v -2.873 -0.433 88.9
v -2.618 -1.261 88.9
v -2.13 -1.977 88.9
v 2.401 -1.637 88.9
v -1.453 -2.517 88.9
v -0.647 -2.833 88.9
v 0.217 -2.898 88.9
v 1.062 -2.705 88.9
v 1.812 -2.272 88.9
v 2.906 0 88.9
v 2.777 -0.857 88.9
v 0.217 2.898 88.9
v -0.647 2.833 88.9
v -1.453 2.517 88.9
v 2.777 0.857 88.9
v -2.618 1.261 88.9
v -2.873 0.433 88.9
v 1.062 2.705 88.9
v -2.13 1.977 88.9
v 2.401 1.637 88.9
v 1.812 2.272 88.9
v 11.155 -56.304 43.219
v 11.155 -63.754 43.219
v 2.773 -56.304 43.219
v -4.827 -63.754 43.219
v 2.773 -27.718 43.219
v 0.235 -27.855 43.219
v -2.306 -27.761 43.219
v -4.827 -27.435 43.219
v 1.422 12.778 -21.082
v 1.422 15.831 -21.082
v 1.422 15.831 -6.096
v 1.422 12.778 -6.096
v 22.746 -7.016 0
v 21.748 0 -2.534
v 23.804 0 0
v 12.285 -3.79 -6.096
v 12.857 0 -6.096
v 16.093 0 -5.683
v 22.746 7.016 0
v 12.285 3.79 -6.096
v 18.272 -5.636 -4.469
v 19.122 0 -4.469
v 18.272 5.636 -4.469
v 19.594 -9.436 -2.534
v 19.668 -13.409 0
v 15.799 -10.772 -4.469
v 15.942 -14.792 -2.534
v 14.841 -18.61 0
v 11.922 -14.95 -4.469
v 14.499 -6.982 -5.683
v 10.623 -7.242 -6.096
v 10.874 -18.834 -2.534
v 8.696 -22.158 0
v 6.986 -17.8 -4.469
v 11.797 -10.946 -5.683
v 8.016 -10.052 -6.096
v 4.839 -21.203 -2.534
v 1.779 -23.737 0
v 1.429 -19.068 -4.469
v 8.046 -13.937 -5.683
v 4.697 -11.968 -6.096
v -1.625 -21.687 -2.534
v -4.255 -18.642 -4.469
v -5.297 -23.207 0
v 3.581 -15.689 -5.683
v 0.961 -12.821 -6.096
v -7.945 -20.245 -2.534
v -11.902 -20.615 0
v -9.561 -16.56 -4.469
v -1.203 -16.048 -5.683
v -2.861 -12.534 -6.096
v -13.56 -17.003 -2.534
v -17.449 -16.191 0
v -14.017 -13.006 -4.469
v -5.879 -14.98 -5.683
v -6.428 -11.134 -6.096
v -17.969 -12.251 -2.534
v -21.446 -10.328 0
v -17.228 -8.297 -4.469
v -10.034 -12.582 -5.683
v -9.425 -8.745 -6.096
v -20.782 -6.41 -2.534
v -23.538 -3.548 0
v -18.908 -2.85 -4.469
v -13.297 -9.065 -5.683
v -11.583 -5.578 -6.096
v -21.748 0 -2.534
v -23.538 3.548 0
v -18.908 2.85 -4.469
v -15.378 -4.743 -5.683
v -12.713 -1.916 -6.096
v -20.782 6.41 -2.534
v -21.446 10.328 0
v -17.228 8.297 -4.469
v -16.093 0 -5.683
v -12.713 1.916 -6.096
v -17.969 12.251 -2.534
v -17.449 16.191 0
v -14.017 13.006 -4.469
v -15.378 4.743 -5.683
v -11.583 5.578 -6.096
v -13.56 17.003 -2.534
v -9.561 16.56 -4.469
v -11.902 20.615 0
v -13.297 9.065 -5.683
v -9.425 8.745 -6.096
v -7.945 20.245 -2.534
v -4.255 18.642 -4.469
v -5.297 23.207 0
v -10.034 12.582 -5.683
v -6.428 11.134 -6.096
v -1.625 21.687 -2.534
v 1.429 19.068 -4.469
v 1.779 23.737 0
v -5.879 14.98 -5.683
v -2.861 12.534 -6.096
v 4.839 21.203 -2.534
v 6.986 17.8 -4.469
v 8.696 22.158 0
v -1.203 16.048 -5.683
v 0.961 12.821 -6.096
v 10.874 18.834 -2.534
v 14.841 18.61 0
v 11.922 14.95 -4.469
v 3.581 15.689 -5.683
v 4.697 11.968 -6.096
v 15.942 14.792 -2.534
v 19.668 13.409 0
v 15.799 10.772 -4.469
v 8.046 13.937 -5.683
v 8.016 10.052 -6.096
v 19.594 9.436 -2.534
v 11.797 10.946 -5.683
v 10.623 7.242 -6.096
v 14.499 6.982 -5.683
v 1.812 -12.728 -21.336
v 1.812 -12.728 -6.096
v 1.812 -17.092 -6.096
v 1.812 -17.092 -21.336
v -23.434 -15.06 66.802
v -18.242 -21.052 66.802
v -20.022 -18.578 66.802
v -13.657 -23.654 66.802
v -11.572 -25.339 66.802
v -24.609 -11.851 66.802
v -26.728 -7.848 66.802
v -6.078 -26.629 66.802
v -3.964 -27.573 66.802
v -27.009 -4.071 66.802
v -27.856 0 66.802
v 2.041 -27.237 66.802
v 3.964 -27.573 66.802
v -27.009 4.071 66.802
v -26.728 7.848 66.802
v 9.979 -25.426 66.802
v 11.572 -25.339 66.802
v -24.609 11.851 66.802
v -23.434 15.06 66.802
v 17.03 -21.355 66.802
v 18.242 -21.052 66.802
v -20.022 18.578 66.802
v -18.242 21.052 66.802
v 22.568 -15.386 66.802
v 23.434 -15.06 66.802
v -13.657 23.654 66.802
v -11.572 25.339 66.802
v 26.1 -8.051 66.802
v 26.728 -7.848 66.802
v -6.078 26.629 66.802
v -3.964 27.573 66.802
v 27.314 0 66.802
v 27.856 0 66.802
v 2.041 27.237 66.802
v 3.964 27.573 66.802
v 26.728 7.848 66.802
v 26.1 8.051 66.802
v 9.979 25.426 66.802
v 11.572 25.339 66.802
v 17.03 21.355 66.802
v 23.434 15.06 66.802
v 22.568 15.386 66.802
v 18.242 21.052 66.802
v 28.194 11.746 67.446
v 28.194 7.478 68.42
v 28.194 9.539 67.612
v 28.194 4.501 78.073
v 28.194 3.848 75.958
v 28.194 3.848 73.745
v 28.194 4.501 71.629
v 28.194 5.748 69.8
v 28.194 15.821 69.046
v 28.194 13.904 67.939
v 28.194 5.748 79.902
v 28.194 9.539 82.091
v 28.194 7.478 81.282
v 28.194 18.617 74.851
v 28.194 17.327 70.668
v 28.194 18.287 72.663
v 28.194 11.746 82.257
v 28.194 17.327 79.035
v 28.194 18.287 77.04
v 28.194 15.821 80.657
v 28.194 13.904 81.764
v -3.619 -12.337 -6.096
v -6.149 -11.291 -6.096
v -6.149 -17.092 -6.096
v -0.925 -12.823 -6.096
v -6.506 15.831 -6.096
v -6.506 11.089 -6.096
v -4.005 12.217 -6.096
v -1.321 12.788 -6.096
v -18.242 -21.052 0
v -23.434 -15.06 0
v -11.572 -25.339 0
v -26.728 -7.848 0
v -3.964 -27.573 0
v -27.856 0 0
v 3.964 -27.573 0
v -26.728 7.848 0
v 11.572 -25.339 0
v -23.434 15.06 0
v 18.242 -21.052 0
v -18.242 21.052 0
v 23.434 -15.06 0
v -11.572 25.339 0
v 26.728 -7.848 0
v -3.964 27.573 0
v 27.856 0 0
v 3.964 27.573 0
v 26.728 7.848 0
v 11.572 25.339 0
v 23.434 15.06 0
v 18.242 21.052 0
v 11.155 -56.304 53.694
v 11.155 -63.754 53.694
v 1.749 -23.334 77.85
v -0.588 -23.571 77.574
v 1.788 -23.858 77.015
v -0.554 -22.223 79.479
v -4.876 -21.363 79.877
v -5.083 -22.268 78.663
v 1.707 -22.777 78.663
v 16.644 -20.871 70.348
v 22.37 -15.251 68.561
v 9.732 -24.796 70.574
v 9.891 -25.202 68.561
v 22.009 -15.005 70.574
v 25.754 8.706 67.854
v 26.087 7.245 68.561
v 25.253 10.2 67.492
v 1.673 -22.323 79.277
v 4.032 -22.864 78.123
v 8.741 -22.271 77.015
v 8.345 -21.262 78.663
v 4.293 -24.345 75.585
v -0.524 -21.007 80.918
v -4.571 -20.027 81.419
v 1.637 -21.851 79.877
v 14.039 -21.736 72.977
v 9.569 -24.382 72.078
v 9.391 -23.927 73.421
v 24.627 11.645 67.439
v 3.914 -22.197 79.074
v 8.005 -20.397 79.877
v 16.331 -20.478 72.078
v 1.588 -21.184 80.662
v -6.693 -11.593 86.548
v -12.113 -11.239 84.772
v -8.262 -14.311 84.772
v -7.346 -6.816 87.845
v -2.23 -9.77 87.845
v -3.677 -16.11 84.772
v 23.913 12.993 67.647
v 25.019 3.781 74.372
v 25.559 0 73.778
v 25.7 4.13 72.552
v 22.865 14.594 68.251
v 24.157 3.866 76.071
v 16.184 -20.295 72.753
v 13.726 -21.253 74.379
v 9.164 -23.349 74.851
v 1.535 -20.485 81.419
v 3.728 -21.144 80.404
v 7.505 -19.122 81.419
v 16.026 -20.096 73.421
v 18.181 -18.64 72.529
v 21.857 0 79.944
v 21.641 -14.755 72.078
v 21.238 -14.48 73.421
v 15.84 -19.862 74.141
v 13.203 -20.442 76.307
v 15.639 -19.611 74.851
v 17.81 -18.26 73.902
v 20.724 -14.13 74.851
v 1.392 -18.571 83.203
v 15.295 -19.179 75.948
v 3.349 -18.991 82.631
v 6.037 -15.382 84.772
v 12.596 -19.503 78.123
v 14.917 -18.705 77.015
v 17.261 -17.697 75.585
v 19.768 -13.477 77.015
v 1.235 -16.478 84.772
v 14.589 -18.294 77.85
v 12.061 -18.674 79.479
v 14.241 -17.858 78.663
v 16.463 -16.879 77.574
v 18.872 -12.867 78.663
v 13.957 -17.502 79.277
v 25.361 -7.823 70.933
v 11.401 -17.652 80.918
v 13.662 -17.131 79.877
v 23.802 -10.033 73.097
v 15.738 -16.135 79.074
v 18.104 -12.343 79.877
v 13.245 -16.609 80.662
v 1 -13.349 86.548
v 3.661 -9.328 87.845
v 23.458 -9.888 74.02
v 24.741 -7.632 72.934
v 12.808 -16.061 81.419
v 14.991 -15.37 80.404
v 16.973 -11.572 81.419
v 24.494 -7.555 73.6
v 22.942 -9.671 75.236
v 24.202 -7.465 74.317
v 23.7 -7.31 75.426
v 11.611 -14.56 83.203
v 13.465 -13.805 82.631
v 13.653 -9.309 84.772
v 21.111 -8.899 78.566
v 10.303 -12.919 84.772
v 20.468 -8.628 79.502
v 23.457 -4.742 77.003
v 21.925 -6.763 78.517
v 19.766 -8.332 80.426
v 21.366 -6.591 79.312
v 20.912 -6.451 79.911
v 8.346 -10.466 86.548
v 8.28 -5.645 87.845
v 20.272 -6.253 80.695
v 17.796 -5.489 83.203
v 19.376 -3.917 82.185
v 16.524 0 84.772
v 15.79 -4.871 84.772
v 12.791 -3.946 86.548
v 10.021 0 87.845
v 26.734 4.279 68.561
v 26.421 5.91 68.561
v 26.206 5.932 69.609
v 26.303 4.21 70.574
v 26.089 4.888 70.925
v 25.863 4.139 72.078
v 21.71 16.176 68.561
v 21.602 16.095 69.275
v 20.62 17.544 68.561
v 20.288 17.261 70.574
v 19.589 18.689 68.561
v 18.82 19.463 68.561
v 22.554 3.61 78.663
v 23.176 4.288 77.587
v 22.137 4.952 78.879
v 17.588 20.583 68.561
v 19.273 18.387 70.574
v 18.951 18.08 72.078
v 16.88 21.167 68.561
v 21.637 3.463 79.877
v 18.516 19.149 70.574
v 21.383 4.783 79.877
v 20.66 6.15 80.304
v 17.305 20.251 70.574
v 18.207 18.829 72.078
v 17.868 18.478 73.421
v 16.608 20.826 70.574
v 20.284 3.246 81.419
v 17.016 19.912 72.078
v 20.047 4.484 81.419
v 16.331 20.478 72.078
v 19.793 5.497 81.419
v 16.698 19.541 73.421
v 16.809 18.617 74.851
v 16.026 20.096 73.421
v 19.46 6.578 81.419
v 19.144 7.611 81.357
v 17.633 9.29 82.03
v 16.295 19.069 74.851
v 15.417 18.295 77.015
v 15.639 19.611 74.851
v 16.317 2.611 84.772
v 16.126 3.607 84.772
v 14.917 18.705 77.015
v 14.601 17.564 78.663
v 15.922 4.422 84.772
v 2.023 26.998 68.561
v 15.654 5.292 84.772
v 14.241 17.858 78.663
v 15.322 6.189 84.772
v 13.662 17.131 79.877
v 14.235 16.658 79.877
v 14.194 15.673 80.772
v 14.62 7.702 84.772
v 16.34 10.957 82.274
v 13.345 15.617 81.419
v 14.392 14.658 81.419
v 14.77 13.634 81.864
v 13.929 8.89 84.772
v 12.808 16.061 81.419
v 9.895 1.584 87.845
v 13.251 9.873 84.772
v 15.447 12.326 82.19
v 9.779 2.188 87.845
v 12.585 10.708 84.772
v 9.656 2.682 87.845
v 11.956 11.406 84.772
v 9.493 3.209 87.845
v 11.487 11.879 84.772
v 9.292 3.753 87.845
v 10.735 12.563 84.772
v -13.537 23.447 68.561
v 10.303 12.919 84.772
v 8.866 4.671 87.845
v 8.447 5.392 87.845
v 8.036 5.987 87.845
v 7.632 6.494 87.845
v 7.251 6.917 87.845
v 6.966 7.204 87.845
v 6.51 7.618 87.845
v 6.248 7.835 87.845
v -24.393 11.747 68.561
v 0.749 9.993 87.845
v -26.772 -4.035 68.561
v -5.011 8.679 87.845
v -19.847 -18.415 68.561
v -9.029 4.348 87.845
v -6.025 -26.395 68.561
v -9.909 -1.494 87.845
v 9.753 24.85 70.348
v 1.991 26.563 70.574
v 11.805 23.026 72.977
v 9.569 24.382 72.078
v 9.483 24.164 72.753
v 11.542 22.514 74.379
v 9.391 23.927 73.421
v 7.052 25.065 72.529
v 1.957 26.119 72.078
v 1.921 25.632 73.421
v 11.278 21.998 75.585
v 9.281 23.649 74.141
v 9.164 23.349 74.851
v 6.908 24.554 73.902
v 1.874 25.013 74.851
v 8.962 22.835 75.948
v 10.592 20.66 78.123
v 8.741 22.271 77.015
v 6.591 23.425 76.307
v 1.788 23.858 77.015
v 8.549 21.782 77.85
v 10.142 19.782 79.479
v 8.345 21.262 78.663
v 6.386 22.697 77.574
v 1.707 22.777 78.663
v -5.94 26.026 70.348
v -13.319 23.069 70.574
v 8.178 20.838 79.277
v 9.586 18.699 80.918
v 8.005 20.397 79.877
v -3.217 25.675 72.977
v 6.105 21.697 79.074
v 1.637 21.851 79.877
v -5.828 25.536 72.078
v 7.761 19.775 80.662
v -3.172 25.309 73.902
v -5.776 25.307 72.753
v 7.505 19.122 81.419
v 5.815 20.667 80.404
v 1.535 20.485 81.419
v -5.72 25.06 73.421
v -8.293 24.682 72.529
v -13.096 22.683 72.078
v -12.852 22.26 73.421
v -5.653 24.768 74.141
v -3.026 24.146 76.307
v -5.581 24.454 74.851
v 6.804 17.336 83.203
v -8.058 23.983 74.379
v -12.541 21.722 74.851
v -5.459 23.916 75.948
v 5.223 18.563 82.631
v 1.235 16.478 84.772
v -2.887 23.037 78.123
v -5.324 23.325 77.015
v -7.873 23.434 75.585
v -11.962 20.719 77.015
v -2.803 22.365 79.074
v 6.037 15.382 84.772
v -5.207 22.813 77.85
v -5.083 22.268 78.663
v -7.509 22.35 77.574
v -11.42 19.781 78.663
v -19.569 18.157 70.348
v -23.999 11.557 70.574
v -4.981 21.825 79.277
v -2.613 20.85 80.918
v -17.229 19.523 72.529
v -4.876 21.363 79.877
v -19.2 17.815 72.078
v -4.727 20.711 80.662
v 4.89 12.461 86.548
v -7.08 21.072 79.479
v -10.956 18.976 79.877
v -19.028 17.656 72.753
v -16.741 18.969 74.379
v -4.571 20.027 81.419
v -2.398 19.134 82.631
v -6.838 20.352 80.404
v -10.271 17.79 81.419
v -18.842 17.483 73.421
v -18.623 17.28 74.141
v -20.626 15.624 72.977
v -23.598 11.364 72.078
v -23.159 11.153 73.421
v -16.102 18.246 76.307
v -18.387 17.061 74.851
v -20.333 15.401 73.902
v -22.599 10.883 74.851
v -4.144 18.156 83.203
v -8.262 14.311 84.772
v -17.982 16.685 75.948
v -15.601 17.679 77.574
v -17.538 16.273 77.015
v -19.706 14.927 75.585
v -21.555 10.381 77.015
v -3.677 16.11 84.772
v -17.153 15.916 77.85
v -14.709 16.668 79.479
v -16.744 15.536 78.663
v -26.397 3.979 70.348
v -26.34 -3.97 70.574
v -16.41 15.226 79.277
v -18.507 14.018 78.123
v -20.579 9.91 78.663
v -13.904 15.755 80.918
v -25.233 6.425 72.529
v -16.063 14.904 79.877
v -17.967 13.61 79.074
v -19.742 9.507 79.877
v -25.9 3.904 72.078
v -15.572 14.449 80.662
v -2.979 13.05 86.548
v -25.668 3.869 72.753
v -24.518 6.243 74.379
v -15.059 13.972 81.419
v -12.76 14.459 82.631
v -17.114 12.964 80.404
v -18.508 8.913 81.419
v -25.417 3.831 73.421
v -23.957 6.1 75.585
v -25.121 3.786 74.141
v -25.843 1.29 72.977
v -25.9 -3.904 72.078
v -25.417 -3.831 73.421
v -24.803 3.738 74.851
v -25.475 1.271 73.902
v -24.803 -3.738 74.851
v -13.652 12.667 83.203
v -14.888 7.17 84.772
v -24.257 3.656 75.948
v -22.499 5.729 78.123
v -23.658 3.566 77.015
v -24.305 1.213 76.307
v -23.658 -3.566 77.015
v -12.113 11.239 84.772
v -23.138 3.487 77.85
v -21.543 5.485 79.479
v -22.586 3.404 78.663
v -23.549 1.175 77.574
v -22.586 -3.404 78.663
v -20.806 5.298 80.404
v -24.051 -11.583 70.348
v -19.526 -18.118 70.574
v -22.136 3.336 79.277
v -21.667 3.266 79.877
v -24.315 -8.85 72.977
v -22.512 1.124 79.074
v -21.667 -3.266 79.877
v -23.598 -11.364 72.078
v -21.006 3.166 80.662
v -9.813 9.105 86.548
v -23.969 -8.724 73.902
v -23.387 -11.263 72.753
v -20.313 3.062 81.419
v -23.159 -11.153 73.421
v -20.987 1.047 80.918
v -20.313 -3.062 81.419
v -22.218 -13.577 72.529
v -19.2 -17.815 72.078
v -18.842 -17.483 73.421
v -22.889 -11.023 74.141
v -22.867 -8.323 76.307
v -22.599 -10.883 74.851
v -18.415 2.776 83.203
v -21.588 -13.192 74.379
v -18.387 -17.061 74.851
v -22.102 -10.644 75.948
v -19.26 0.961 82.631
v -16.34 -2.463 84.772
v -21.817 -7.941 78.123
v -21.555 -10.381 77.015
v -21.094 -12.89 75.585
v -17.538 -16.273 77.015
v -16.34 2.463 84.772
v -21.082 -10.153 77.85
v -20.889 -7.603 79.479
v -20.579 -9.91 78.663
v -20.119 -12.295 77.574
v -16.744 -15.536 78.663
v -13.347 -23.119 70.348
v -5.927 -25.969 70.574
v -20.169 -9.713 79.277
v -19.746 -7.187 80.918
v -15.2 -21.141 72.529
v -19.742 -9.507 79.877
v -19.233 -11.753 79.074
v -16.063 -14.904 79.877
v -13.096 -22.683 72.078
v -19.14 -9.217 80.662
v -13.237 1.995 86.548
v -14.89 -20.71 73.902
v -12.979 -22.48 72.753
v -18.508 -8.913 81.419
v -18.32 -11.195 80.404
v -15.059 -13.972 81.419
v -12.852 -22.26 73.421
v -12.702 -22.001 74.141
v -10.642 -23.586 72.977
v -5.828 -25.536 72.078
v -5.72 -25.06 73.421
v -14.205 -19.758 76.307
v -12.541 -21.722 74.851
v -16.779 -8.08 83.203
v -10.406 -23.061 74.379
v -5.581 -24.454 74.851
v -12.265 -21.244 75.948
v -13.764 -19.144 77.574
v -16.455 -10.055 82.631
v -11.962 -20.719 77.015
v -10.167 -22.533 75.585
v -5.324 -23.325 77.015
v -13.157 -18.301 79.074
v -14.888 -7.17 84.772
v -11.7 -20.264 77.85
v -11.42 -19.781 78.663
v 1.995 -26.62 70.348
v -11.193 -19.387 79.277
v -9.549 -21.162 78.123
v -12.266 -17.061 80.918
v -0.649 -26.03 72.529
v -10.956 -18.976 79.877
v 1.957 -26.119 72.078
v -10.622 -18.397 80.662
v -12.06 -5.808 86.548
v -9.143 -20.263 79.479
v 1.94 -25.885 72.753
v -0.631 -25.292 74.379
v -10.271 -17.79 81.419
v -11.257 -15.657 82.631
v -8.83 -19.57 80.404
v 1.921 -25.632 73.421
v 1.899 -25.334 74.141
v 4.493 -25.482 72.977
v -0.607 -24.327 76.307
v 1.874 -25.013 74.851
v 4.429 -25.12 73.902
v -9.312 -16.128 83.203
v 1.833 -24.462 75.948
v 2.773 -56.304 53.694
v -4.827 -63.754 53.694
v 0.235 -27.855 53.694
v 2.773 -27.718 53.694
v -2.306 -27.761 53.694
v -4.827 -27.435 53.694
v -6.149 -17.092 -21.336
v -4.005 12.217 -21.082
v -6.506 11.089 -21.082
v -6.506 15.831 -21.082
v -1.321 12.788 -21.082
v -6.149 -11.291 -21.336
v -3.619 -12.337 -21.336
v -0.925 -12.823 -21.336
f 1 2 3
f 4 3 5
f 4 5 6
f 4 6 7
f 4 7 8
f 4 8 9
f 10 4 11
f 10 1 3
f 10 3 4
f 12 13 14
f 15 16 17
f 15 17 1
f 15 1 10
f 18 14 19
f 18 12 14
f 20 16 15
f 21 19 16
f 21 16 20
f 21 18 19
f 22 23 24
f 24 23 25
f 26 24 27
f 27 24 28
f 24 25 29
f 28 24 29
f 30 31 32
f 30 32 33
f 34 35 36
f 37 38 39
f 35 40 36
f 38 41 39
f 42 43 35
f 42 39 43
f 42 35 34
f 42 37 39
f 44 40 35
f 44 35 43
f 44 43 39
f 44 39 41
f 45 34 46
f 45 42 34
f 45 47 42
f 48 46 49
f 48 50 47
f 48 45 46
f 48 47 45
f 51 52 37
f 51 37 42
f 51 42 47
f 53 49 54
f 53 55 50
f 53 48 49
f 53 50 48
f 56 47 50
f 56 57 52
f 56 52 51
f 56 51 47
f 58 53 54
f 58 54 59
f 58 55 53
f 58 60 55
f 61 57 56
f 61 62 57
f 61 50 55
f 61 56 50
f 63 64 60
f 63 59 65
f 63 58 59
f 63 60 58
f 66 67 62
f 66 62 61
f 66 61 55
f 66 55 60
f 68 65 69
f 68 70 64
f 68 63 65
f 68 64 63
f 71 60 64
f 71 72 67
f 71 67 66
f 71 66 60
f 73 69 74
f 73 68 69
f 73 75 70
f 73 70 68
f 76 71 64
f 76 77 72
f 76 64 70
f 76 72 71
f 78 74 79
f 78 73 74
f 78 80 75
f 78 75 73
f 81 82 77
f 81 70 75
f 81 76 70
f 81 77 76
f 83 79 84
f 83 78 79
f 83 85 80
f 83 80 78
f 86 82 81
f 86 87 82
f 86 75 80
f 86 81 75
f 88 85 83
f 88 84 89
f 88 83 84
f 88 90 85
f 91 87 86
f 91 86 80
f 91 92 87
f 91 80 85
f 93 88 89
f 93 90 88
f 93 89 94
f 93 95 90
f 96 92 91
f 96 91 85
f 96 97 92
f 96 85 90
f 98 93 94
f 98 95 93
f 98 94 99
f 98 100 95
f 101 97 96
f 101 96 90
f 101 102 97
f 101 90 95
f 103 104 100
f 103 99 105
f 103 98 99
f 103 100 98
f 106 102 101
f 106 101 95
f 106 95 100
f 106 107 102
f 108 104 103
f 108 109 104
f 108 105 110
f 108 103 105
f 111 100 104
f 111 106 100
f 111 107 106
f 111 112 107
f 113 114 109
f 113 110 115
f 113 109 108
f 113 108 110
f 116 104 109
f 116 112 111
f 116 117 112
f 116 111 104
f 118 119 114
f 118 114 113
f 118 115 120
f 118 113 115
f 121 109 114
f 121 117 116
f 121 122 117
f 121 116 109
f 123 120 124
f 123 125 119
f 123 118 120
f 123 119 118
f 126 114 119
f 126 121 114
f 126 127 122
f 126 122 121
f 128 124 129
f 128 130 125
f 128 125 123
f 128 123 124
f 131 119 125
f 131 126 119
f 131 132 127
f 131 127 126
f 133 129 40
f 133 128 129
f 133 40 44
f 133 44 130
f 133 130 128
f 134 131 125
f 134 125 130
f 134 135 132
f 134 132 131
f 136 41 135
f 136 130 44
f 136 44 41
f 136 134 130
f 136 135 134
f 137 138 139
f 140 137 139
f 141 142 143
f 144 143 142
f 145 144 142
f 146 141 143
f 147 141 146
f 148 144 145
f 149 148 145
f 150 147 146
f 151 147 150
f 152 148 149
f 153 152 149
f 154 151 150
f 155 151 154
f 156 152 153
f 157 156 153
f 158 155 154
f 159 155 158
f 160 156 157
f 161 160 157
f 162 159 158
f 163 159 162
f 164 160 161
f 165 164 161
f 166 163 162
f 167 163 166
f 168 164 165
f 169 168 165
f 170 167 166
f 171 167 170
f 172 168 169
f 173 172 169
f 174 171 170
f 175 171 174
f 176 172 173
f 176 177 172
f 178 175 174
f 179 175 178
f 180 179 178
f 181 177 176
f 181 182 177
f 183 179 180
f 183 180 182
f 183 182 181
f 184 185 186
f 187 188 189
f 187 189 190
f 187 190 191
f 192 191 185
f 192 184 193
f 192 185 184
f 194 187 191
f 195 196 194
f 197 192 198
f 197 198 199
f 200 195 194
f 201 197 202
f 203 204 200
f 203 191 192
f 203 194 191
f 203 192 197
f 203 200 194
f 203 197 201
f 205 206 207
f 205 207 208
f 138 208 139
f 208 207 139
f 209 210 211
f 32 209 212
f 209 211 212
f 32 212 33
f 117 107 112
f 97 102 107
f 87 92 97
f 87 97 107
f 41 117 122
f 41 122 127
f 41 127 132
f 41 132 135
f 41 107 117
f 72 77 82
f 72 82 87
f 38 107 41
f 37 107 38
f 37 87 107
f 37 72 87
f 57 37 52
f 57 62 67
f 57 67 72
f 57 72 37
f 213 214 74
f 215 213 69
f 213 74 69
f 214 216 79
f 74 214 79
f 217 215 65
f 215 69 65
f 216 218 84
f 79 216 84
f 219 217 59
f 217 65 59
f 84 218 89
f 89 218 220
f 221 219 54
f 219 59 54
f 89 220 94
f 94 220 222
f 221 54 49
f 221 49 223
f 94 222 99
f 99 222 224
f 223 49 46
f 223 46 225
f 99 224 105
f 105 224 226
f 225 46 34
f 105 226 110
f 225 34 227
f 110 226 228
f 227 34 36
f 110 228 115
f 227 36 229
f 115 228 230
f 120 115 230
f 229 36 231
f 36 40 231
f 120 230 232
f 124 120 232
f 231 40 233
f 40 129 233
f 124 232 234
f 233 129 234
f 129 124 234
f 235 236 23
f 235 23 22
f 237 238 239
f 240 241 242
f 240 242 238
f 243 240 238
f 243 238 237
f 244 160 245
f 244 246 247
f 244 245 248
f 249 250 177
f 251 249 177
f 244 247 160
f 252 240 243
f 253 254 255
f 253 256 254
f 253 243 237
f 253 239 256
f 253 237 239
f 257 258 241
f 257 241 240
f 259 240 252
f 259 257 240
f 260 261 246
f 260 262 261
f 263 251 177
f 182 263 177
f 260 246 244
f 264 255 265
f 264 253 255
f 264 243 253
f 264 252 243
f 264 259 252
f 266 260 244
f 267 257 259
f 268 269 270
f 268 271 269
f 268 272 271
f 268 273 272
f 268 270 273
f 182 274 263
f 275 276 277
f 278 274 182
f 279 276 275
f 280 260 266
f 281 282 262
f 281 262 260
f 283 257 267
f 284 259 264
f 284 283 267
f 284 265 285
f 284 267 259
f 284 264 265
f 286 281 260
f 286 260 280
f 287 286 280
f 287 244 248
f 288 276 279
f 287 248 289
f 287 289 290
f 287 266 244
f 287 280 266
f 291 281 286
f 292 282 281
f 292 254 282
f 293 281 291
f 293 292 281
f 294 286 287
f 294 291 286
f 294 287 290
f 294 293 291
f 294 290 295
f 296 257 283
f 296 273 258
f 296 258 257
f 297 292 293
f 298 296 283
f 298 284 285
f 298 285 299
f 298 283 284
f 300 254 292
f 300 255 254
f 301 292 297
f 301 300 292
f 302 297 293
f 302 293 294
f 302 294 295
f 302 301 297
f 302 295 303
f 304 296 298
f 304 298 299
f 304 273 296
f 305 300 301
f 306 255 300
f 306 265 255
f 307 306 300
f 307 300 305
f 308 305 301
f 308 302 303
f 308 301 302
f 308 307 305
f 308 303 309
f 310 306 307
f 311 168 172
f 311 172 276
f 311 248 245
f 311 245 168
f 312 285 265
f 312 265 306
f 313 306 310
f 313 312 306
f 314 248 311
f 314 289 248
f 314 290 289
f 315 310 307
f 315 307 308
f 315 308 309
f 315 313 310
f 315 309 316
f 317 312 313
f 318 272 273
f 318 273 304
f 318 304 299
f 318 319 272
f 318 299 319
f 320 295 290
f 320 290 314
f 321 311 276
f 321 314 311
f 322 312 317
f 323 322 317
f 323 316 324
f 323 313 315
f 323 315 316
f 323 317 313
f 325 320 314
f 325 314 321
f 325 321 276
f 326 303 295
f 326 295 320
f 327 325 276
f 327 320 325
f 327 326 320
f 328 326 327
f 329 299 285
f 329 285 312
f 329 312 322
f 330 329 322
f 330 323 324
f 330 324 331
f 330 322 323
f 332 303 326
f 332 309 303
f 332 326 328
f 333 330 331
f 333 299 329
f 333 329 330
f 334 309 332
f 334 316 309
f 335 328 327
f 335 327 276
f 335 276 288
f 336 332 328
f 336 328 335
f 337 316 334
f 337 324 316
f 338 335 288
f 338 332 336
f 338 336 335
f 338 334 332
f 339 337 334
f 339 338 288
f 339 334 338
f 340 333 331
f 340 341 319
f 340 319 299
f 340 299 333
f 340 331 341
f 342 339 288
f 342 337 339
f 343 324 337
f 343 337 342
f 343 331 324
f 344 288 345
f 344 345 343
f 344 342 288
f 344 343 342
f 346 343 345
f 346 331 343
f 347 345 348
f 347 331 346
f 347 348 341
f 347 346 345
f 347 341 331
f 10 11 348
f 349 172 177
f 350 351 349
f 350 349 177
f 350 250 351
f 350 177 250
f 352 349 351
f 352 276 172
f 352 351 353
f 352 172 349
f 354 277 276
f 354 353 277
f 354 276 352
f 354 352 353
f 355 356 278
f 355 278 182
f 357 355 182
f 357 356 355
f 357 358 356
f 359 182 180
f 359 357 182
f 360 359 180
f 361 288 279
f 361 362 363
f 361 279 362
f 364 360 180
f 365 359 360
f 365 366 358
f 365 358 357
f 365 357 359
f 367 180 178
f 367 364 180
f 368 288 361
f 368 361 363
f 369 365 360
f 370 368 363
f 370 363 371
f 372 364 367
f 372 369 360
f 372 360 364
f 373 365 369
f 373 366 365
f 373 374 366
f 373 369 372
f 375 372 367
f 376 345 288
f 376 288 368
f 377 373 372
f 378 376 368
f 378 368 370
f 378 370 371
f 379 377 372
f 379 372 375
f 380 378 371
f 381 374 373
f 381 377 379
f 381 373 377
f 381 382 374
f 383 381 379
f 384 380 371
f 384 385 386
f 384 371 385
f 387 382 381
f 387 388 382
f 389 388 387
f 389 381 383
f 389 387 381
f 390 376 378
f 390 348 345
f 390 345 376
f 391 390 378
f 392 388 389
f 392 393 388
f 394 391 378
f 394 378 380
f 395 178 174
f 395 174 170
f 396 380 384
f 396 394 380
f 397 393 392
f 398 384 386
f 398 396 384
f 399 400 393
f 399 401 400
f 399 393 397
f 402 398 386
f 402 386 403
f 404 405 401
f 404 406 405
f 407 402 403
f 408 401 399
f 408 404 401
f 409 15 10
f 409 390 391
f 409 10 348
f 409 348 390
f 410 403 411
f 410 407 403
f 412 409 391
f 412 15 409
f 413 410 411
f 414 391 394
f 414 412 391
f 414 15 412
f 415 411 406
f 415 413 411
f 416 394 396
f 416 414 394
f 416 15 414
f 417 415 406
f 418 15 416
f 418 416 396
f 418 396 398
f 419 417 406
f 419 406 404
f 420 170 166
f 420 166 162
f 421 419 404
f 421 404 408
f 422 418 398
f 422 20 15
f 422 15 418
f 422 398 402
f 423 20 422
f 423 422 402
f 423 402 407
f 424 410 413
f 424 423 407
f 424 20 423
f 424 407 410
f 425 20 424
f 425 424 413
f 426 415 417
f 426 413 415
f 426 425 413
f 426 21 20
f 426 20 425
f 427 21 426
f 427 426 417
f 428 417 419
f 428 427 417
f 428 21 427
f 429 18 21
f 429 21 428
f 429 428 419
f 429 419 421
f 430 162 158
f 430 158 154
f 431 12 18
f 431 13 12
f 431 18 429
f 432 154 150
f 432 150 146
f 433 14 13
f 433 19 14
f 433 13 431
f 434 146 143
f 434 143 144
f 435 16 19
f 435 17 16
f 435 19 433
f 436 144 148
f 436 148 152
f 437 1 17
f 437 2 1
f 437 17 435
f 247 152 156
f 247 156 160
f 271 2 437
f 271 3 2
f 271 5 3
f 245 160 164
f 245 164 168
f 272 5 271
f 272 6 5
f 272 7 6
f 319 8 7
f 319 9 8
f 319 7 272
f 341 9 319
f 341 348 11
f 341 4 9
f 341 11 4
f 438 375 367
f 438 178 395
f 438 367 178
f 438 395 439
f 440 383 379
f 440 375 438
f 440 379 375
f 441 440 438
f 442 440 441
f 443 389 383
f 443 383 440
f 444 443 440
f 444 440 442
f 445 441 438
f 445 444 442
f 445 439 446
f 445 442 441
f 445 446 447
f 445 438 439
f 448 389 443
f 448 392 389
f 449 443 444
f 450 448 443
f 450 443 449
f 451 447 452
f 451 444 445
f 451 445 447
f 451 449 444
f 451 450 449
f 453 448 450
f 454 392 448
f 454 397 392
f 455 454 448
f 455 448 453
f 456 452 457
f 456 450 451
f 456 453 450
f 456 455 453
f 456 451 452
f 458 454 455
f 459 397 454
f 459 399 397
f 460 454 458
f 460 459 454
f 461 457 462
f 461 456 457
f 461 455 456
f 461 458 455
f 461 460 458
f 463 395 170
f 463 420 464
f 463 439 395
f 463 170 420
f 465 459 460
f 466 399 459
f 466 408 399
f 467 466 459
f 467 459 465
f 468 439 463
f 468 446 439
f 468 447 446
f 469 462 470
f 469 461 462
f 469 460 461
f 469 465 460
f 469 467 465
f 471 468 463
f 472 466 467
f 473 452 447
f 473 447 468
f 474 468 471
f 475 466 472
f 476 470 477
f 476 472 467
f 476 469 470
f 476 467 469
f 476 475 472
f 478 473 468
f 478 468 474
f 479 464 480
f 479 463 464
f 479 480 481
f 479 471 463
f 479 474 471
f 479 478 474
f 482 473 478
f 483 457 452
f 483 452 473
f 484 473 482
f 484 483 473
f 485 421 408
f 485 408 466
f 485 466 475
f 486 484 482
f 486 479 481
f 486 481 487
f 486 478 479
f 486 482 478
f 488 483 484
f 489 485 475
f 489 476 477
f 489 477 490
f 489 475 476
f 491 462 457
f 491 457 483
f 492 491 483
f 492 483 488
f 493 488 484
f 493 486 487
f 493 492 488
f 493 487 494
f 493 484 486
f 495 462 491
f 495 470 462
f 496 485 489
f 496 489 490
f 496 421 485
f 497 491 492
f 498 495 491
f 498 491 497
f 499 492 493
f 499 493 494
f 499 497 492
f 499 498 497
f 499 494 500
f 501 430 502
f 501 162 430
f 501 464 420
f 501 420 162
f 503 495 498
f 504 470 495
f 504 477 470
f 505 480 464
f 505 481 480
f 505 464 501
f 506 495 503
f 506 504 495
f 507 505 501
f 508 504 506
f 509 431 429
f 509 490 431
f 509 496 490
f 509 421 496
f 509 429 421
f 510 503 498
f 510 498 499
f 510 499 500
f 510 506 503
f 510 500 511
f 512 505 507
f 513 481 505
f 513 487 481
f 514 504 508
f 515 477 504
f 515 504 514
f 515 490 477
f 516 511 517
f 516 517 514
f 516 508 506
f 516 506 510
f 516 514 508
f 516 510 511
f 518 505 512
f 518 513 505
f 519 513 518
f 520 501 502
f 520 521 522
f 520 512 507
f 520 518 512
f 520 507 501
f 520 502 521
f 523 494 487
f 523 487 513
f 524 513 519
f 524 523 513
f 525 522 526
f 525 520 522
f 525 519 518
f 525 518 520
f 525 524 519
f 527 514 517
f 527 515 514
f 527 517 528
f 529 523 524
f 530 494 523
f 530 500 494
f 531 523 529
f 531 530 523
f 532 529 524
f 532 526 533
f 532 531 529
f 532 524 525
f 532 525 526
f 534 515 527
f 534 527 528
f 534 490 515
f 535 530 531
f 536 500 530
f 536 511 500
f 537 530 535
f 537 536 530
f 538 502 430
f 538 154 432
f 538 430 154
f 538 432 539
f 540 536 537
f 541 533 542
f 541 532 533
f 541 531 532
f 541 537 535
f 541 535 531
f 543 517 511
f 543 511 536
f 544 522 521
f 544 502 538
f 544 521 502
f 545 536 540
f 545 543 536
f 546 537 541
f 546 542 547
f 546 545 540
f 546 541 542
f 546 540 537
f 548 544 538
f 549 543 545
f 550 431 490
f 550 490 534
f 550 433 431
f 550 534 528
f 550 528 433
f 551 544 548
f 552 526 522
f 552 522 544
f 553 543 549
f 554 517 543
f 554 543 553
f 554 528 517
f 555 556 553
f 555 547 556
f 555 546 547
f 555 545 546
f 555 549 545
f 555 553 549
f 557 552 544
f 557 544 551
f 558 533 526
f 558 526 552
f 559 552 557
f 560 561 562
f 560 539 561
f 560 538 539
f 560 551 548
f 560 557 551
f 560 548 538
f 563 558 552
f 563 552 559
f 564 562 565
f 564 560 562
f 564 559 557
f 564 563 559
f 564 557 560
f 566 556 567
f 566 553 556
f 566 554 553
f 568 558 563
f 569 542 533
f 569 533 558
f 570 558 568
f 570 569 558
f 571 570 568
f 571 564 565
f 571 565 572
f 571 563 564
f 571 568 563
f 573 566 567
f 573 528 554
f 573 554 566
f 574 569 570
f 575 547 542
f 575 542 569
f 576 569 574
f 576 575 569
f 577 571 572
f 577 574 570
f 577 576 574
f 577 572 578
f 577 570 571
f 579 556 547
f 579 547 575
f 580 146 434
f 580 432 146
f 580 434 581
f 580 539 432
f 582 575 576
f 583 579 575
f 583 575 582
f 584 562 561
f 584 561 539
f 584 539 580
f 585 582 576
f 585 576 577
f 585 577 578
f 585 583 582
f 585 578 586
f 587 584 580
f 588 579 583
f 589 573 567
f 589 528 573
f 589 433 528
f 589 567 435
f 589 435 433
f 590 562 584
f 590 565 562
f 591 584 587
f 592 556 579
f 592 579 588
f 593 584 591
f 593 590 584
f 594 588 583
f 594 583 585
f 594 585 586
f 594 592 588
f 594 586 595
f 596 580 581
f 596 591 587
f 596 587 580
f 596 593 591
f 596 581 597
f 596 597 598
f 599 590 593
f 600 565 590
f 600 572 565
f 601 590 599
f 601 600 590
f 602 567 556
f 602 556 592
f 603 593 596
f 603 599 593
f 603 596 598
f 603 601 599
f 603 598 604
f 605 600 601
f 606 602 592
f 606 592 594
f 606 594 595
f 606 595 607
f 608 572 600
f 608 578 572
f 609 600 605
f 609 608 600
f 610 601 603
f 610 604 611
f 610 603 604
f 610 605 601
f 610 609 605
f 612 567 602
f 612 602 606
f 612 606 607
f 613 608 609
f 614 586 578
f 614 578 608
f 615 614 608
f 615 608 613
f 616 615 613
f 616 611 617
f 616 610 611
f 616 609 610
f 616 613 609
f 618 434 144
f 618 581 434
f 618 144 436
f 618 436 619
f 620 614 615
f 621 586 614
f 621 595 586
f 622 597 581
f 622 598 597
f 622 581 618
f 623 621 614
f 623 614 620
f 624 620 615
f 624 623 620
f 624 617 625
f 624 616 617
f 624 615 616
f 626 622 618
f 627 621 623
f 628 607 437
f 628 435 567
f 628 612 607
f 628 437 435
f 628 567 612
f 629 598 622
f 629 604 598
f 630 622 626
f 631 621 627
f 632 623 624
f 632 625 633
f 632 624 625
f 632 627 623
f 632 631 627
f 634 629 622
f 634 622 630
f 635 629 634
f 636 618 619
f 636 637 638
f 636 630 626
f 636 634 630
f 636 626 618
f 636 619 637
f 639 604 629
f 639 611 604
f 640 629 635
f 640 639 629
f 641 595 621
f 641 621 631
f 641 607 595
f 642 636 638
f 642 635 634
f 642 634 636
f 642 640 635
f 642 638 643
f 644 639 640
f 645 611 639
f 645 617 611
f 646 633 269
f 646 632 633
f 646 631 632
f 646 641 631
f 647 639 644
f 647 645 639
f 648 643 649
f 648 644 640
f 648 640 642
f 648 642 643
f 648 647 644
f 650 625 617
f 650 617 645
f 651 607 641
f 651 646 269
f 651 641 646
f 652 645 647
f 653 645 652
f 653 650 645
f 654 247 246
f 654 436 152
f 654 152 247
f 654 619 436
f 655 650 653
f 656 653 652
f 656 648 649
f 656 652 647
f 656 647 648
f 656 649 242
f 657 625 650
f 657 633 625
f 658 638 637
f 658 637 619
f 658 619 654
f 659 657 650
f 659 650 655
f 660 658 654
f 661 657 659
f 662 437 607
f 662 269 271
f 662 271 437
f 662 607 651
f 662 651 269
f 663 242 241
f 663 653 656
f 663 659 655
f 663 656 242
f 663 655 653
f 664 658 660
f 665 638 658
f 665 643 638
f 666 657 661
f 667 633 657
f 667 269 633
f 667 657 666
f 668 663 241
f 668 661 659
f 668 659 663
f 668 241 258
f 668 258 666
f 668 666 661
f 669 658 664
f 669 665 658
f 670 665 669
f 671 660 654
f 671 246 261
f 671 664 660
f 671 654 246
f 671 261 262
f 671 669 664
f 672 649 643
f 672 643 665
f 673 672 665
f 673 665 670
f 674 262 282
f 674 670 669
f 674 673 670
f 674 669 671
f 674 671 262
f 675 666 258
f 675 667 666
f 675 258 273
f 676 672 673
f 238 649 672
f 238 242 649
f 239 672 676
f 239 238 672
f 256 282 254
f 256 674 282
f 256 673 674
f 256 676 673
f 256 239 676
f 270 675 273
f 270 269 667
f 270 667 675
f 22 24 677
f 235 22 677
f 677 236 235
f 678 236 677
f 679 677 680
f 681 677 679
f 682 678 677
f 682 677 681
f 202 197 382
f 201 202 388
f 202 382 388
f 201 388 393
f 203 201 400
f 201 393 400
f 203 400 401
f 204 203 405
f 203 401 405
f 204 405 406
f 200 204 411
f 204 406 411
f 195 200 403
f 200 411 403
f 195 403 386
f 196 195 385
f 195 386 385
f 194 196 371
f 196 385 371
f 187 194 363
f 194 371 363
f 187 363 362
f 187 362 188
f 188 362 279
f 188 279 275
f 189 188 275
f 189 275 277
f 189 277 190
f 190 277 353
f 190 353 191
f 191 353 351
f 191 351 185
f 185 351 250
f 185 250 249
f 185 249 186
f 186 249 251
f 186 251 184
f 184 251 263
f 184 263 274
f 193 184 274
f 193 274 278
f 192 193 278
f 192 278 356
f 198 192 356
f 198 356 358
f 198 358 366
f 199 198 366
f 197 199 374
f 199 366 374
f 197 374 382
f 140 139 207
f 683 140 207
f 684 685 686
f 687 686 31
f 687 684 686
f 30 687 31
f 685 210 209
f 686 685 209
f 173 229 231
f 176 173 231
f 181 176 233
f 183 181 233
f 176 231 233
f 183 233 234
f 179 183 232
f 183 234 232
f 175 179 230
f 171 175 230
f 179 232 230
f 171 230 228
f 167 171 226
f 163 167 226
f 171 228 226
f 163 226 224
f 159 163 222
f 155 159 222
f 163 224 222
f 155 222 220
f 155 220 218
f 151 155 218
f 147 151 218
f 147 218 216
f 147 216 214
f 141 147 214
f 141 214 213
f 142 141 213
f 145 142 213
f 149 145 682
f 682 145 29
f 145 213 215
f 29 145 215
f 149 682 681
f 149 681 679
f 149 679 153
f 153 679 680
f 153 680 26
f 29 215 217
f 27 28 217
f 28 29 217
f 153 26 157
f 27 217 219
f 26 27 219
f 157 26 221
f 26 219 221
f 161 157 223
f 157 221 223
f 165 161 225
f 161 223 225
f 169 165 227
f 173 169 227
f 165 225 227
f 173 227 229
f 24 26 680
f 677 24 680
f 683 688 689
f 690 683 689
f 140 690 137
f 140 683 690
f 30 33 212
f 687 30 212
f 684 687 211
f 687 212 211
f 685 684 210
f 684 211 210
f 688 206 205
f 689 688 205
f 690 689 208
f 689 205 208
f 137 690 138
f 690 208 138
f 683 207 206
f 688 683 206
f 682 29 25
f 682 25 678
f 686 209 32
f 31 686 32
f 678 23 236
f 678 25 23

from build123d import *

# Parameters (mm, degrees)
F0_R      = 27.8562682198
F1_DEPTH  = 66.802
F2_R      = 27.3136197641
F3_DEPTH  = 22.098
F5_R      = 23.8036961542
F6_DEPTH  = 6.096
F9_DEPTH  = 15.24
F11_DEPTH = 14.986
F12_R     = 7.4259610206
F13_DEPTH = 28.194
F14_W     = 7.5996846426
F14_H     = 10.4752443731
F15_DEPTH = 63.754
F16_W     = 7.4501263418
F16_H     = 10.4752443731
F17_DEPTH = 8.382


# Not quite as in the source:
# - a fillet or chamfer that OpenCascade refuses, or shapes differently, is made with other operations: its cross-section is extruded or revolved along the edge and cut away or added


with BuildPart() as f1:
    # F0 (on Top) → F1 (new body)
    with BuildSketch(Plane.XY):
        Circle(F0_R)
    extrude(amount=F1_DEPTH)

    # F2 (on face) → F3 (join)
    with BuildSketch(Plane.XY.offset(66.802)):
        Circle(F2_R)
    extrude(amount=F3_DEPTH)

    # F4: fillet of radius 24.5284097937 on 1 edges, made by hand

    # F4_s1 → F4_t2 (revolve, cut)
    with BuildSketch(Plane.XZ):
        with BuildLine():
            ThreePointArc((27.3136197641, 66.802), (19.3684311501, 82.5547826432), (2.9059161596, 88.9))
            Line((2.9059161596, 88.9), (27.3136197641, 88.9))
            Line((27.3136197641, 88.9), (27.3136197641, 66.802))
        make_face()
    revolve(axis=Axis((0, 0, 88.9), (0, 0, 1)), mode=Mode.SUBTRACT)

    # F5 (on face) → F6 (join)
    with BuildSketch(Plane(origin=(0, 0, 0), x_dir=(1, 0, 0), z_dir=(0, 0, -1))):
        Circle(F5_R)
    extrude(amount=F6_DEPTH)

    # F7: fillet of radius 12.8774151417 on 1 edges, made by hand

    # F7_s1 → F7_t2 (revolve, cut)
    with BuildSketch(Plane.XZ):
        with BuildLine():
            ThreePointArc((23.8036961542, 0), (19.1215508115, -4.4692497), (12.8565399295, -6.096))
            Line((12.8565399295, -6.096), (23.8036961542, -6.096))
            Line((23.8036961542, -6.096), (23.8036961542, 0))
        make_face()
    revolve(axis=Axis((0, 0, -6.096), (0, 0, -1)), mode=Mode.SUBTRACT)

    # F12 (on Right) → F13 (join)
    with BuildSketch(Plane.YZ):
        with Locations((11.1912228167, 74.8514011502)):
            Circle(F12_R)
    extrude(amount=F13_DEPTH)

    # F14 (on Front) → F15 (join)
    with BuildSketch(Plane.XZ):
        with Locations((-1.0269851191, 48.4563689679)):
            Rectangle(F14_W, F14_H)
    extrude(amount=F15_DEPTH)

    # F16 (on face) → F17 (join)
    with BuildSketch(Plane.YZ.offset(2.7728572022)):
        with Locations((-60.0289368291, 48.4563689679)):
            Rectangle(F16_W, F16_H)
    extrude(amount=F17_DEPTH)


with BuildPart() as f9:
    # F8 (on face) → F9 (new body)
    with BuildSketch(Plane(origin=(0, 0, -6.096), x_dir=(1, 0, 0), z_dir=(0, 0, -1))):
        with BuildLine():
            ThreePointArc((-6.149337627, 11.2905387696), (-2.2848463598, 12.6518811278), (1.8117026193, 12.7282501774))
            Line((1.8117026193, 12.7282501774), (1.8117026193, 17.0915536582))
            Line((1.8117026193, 17.0915536582), (-6.149337627, 17.0915536582))
            Line((-6.149337627, 17.0915536582), (-6.149337627, 11.2905387696))
        make_face()
    extrude(amount=F9_DEPTH)


with BuildPart() as f11:
    # F10 (on face) → F11 (new body)
    with BuildSketch(Plane(origin=(0, 0, -6.096), x_dir=(1, 0, 0), z_dir=(0, 0, -1))):
        with BuildLine():
            Line((-6.505724193, -15.8313624561), (1.4219782315, -15.8313624561))
            Line((1.4219782315, -15.8313624561), (1.4219782315, -12.7776600701))
            ThreePointArc((1.4219782315, -12.7776600701), (-2.6784327348, -12.5744430113), (-6.505724193, -11.0890113032))
            Line((-6.505724193, -11.0890113032), (-6.505724193, -15.8313624561))
        make_face()
    extrude(amount=F11_DEPTH)


solid = Compound([f1.part, f9.part, f11.part])
